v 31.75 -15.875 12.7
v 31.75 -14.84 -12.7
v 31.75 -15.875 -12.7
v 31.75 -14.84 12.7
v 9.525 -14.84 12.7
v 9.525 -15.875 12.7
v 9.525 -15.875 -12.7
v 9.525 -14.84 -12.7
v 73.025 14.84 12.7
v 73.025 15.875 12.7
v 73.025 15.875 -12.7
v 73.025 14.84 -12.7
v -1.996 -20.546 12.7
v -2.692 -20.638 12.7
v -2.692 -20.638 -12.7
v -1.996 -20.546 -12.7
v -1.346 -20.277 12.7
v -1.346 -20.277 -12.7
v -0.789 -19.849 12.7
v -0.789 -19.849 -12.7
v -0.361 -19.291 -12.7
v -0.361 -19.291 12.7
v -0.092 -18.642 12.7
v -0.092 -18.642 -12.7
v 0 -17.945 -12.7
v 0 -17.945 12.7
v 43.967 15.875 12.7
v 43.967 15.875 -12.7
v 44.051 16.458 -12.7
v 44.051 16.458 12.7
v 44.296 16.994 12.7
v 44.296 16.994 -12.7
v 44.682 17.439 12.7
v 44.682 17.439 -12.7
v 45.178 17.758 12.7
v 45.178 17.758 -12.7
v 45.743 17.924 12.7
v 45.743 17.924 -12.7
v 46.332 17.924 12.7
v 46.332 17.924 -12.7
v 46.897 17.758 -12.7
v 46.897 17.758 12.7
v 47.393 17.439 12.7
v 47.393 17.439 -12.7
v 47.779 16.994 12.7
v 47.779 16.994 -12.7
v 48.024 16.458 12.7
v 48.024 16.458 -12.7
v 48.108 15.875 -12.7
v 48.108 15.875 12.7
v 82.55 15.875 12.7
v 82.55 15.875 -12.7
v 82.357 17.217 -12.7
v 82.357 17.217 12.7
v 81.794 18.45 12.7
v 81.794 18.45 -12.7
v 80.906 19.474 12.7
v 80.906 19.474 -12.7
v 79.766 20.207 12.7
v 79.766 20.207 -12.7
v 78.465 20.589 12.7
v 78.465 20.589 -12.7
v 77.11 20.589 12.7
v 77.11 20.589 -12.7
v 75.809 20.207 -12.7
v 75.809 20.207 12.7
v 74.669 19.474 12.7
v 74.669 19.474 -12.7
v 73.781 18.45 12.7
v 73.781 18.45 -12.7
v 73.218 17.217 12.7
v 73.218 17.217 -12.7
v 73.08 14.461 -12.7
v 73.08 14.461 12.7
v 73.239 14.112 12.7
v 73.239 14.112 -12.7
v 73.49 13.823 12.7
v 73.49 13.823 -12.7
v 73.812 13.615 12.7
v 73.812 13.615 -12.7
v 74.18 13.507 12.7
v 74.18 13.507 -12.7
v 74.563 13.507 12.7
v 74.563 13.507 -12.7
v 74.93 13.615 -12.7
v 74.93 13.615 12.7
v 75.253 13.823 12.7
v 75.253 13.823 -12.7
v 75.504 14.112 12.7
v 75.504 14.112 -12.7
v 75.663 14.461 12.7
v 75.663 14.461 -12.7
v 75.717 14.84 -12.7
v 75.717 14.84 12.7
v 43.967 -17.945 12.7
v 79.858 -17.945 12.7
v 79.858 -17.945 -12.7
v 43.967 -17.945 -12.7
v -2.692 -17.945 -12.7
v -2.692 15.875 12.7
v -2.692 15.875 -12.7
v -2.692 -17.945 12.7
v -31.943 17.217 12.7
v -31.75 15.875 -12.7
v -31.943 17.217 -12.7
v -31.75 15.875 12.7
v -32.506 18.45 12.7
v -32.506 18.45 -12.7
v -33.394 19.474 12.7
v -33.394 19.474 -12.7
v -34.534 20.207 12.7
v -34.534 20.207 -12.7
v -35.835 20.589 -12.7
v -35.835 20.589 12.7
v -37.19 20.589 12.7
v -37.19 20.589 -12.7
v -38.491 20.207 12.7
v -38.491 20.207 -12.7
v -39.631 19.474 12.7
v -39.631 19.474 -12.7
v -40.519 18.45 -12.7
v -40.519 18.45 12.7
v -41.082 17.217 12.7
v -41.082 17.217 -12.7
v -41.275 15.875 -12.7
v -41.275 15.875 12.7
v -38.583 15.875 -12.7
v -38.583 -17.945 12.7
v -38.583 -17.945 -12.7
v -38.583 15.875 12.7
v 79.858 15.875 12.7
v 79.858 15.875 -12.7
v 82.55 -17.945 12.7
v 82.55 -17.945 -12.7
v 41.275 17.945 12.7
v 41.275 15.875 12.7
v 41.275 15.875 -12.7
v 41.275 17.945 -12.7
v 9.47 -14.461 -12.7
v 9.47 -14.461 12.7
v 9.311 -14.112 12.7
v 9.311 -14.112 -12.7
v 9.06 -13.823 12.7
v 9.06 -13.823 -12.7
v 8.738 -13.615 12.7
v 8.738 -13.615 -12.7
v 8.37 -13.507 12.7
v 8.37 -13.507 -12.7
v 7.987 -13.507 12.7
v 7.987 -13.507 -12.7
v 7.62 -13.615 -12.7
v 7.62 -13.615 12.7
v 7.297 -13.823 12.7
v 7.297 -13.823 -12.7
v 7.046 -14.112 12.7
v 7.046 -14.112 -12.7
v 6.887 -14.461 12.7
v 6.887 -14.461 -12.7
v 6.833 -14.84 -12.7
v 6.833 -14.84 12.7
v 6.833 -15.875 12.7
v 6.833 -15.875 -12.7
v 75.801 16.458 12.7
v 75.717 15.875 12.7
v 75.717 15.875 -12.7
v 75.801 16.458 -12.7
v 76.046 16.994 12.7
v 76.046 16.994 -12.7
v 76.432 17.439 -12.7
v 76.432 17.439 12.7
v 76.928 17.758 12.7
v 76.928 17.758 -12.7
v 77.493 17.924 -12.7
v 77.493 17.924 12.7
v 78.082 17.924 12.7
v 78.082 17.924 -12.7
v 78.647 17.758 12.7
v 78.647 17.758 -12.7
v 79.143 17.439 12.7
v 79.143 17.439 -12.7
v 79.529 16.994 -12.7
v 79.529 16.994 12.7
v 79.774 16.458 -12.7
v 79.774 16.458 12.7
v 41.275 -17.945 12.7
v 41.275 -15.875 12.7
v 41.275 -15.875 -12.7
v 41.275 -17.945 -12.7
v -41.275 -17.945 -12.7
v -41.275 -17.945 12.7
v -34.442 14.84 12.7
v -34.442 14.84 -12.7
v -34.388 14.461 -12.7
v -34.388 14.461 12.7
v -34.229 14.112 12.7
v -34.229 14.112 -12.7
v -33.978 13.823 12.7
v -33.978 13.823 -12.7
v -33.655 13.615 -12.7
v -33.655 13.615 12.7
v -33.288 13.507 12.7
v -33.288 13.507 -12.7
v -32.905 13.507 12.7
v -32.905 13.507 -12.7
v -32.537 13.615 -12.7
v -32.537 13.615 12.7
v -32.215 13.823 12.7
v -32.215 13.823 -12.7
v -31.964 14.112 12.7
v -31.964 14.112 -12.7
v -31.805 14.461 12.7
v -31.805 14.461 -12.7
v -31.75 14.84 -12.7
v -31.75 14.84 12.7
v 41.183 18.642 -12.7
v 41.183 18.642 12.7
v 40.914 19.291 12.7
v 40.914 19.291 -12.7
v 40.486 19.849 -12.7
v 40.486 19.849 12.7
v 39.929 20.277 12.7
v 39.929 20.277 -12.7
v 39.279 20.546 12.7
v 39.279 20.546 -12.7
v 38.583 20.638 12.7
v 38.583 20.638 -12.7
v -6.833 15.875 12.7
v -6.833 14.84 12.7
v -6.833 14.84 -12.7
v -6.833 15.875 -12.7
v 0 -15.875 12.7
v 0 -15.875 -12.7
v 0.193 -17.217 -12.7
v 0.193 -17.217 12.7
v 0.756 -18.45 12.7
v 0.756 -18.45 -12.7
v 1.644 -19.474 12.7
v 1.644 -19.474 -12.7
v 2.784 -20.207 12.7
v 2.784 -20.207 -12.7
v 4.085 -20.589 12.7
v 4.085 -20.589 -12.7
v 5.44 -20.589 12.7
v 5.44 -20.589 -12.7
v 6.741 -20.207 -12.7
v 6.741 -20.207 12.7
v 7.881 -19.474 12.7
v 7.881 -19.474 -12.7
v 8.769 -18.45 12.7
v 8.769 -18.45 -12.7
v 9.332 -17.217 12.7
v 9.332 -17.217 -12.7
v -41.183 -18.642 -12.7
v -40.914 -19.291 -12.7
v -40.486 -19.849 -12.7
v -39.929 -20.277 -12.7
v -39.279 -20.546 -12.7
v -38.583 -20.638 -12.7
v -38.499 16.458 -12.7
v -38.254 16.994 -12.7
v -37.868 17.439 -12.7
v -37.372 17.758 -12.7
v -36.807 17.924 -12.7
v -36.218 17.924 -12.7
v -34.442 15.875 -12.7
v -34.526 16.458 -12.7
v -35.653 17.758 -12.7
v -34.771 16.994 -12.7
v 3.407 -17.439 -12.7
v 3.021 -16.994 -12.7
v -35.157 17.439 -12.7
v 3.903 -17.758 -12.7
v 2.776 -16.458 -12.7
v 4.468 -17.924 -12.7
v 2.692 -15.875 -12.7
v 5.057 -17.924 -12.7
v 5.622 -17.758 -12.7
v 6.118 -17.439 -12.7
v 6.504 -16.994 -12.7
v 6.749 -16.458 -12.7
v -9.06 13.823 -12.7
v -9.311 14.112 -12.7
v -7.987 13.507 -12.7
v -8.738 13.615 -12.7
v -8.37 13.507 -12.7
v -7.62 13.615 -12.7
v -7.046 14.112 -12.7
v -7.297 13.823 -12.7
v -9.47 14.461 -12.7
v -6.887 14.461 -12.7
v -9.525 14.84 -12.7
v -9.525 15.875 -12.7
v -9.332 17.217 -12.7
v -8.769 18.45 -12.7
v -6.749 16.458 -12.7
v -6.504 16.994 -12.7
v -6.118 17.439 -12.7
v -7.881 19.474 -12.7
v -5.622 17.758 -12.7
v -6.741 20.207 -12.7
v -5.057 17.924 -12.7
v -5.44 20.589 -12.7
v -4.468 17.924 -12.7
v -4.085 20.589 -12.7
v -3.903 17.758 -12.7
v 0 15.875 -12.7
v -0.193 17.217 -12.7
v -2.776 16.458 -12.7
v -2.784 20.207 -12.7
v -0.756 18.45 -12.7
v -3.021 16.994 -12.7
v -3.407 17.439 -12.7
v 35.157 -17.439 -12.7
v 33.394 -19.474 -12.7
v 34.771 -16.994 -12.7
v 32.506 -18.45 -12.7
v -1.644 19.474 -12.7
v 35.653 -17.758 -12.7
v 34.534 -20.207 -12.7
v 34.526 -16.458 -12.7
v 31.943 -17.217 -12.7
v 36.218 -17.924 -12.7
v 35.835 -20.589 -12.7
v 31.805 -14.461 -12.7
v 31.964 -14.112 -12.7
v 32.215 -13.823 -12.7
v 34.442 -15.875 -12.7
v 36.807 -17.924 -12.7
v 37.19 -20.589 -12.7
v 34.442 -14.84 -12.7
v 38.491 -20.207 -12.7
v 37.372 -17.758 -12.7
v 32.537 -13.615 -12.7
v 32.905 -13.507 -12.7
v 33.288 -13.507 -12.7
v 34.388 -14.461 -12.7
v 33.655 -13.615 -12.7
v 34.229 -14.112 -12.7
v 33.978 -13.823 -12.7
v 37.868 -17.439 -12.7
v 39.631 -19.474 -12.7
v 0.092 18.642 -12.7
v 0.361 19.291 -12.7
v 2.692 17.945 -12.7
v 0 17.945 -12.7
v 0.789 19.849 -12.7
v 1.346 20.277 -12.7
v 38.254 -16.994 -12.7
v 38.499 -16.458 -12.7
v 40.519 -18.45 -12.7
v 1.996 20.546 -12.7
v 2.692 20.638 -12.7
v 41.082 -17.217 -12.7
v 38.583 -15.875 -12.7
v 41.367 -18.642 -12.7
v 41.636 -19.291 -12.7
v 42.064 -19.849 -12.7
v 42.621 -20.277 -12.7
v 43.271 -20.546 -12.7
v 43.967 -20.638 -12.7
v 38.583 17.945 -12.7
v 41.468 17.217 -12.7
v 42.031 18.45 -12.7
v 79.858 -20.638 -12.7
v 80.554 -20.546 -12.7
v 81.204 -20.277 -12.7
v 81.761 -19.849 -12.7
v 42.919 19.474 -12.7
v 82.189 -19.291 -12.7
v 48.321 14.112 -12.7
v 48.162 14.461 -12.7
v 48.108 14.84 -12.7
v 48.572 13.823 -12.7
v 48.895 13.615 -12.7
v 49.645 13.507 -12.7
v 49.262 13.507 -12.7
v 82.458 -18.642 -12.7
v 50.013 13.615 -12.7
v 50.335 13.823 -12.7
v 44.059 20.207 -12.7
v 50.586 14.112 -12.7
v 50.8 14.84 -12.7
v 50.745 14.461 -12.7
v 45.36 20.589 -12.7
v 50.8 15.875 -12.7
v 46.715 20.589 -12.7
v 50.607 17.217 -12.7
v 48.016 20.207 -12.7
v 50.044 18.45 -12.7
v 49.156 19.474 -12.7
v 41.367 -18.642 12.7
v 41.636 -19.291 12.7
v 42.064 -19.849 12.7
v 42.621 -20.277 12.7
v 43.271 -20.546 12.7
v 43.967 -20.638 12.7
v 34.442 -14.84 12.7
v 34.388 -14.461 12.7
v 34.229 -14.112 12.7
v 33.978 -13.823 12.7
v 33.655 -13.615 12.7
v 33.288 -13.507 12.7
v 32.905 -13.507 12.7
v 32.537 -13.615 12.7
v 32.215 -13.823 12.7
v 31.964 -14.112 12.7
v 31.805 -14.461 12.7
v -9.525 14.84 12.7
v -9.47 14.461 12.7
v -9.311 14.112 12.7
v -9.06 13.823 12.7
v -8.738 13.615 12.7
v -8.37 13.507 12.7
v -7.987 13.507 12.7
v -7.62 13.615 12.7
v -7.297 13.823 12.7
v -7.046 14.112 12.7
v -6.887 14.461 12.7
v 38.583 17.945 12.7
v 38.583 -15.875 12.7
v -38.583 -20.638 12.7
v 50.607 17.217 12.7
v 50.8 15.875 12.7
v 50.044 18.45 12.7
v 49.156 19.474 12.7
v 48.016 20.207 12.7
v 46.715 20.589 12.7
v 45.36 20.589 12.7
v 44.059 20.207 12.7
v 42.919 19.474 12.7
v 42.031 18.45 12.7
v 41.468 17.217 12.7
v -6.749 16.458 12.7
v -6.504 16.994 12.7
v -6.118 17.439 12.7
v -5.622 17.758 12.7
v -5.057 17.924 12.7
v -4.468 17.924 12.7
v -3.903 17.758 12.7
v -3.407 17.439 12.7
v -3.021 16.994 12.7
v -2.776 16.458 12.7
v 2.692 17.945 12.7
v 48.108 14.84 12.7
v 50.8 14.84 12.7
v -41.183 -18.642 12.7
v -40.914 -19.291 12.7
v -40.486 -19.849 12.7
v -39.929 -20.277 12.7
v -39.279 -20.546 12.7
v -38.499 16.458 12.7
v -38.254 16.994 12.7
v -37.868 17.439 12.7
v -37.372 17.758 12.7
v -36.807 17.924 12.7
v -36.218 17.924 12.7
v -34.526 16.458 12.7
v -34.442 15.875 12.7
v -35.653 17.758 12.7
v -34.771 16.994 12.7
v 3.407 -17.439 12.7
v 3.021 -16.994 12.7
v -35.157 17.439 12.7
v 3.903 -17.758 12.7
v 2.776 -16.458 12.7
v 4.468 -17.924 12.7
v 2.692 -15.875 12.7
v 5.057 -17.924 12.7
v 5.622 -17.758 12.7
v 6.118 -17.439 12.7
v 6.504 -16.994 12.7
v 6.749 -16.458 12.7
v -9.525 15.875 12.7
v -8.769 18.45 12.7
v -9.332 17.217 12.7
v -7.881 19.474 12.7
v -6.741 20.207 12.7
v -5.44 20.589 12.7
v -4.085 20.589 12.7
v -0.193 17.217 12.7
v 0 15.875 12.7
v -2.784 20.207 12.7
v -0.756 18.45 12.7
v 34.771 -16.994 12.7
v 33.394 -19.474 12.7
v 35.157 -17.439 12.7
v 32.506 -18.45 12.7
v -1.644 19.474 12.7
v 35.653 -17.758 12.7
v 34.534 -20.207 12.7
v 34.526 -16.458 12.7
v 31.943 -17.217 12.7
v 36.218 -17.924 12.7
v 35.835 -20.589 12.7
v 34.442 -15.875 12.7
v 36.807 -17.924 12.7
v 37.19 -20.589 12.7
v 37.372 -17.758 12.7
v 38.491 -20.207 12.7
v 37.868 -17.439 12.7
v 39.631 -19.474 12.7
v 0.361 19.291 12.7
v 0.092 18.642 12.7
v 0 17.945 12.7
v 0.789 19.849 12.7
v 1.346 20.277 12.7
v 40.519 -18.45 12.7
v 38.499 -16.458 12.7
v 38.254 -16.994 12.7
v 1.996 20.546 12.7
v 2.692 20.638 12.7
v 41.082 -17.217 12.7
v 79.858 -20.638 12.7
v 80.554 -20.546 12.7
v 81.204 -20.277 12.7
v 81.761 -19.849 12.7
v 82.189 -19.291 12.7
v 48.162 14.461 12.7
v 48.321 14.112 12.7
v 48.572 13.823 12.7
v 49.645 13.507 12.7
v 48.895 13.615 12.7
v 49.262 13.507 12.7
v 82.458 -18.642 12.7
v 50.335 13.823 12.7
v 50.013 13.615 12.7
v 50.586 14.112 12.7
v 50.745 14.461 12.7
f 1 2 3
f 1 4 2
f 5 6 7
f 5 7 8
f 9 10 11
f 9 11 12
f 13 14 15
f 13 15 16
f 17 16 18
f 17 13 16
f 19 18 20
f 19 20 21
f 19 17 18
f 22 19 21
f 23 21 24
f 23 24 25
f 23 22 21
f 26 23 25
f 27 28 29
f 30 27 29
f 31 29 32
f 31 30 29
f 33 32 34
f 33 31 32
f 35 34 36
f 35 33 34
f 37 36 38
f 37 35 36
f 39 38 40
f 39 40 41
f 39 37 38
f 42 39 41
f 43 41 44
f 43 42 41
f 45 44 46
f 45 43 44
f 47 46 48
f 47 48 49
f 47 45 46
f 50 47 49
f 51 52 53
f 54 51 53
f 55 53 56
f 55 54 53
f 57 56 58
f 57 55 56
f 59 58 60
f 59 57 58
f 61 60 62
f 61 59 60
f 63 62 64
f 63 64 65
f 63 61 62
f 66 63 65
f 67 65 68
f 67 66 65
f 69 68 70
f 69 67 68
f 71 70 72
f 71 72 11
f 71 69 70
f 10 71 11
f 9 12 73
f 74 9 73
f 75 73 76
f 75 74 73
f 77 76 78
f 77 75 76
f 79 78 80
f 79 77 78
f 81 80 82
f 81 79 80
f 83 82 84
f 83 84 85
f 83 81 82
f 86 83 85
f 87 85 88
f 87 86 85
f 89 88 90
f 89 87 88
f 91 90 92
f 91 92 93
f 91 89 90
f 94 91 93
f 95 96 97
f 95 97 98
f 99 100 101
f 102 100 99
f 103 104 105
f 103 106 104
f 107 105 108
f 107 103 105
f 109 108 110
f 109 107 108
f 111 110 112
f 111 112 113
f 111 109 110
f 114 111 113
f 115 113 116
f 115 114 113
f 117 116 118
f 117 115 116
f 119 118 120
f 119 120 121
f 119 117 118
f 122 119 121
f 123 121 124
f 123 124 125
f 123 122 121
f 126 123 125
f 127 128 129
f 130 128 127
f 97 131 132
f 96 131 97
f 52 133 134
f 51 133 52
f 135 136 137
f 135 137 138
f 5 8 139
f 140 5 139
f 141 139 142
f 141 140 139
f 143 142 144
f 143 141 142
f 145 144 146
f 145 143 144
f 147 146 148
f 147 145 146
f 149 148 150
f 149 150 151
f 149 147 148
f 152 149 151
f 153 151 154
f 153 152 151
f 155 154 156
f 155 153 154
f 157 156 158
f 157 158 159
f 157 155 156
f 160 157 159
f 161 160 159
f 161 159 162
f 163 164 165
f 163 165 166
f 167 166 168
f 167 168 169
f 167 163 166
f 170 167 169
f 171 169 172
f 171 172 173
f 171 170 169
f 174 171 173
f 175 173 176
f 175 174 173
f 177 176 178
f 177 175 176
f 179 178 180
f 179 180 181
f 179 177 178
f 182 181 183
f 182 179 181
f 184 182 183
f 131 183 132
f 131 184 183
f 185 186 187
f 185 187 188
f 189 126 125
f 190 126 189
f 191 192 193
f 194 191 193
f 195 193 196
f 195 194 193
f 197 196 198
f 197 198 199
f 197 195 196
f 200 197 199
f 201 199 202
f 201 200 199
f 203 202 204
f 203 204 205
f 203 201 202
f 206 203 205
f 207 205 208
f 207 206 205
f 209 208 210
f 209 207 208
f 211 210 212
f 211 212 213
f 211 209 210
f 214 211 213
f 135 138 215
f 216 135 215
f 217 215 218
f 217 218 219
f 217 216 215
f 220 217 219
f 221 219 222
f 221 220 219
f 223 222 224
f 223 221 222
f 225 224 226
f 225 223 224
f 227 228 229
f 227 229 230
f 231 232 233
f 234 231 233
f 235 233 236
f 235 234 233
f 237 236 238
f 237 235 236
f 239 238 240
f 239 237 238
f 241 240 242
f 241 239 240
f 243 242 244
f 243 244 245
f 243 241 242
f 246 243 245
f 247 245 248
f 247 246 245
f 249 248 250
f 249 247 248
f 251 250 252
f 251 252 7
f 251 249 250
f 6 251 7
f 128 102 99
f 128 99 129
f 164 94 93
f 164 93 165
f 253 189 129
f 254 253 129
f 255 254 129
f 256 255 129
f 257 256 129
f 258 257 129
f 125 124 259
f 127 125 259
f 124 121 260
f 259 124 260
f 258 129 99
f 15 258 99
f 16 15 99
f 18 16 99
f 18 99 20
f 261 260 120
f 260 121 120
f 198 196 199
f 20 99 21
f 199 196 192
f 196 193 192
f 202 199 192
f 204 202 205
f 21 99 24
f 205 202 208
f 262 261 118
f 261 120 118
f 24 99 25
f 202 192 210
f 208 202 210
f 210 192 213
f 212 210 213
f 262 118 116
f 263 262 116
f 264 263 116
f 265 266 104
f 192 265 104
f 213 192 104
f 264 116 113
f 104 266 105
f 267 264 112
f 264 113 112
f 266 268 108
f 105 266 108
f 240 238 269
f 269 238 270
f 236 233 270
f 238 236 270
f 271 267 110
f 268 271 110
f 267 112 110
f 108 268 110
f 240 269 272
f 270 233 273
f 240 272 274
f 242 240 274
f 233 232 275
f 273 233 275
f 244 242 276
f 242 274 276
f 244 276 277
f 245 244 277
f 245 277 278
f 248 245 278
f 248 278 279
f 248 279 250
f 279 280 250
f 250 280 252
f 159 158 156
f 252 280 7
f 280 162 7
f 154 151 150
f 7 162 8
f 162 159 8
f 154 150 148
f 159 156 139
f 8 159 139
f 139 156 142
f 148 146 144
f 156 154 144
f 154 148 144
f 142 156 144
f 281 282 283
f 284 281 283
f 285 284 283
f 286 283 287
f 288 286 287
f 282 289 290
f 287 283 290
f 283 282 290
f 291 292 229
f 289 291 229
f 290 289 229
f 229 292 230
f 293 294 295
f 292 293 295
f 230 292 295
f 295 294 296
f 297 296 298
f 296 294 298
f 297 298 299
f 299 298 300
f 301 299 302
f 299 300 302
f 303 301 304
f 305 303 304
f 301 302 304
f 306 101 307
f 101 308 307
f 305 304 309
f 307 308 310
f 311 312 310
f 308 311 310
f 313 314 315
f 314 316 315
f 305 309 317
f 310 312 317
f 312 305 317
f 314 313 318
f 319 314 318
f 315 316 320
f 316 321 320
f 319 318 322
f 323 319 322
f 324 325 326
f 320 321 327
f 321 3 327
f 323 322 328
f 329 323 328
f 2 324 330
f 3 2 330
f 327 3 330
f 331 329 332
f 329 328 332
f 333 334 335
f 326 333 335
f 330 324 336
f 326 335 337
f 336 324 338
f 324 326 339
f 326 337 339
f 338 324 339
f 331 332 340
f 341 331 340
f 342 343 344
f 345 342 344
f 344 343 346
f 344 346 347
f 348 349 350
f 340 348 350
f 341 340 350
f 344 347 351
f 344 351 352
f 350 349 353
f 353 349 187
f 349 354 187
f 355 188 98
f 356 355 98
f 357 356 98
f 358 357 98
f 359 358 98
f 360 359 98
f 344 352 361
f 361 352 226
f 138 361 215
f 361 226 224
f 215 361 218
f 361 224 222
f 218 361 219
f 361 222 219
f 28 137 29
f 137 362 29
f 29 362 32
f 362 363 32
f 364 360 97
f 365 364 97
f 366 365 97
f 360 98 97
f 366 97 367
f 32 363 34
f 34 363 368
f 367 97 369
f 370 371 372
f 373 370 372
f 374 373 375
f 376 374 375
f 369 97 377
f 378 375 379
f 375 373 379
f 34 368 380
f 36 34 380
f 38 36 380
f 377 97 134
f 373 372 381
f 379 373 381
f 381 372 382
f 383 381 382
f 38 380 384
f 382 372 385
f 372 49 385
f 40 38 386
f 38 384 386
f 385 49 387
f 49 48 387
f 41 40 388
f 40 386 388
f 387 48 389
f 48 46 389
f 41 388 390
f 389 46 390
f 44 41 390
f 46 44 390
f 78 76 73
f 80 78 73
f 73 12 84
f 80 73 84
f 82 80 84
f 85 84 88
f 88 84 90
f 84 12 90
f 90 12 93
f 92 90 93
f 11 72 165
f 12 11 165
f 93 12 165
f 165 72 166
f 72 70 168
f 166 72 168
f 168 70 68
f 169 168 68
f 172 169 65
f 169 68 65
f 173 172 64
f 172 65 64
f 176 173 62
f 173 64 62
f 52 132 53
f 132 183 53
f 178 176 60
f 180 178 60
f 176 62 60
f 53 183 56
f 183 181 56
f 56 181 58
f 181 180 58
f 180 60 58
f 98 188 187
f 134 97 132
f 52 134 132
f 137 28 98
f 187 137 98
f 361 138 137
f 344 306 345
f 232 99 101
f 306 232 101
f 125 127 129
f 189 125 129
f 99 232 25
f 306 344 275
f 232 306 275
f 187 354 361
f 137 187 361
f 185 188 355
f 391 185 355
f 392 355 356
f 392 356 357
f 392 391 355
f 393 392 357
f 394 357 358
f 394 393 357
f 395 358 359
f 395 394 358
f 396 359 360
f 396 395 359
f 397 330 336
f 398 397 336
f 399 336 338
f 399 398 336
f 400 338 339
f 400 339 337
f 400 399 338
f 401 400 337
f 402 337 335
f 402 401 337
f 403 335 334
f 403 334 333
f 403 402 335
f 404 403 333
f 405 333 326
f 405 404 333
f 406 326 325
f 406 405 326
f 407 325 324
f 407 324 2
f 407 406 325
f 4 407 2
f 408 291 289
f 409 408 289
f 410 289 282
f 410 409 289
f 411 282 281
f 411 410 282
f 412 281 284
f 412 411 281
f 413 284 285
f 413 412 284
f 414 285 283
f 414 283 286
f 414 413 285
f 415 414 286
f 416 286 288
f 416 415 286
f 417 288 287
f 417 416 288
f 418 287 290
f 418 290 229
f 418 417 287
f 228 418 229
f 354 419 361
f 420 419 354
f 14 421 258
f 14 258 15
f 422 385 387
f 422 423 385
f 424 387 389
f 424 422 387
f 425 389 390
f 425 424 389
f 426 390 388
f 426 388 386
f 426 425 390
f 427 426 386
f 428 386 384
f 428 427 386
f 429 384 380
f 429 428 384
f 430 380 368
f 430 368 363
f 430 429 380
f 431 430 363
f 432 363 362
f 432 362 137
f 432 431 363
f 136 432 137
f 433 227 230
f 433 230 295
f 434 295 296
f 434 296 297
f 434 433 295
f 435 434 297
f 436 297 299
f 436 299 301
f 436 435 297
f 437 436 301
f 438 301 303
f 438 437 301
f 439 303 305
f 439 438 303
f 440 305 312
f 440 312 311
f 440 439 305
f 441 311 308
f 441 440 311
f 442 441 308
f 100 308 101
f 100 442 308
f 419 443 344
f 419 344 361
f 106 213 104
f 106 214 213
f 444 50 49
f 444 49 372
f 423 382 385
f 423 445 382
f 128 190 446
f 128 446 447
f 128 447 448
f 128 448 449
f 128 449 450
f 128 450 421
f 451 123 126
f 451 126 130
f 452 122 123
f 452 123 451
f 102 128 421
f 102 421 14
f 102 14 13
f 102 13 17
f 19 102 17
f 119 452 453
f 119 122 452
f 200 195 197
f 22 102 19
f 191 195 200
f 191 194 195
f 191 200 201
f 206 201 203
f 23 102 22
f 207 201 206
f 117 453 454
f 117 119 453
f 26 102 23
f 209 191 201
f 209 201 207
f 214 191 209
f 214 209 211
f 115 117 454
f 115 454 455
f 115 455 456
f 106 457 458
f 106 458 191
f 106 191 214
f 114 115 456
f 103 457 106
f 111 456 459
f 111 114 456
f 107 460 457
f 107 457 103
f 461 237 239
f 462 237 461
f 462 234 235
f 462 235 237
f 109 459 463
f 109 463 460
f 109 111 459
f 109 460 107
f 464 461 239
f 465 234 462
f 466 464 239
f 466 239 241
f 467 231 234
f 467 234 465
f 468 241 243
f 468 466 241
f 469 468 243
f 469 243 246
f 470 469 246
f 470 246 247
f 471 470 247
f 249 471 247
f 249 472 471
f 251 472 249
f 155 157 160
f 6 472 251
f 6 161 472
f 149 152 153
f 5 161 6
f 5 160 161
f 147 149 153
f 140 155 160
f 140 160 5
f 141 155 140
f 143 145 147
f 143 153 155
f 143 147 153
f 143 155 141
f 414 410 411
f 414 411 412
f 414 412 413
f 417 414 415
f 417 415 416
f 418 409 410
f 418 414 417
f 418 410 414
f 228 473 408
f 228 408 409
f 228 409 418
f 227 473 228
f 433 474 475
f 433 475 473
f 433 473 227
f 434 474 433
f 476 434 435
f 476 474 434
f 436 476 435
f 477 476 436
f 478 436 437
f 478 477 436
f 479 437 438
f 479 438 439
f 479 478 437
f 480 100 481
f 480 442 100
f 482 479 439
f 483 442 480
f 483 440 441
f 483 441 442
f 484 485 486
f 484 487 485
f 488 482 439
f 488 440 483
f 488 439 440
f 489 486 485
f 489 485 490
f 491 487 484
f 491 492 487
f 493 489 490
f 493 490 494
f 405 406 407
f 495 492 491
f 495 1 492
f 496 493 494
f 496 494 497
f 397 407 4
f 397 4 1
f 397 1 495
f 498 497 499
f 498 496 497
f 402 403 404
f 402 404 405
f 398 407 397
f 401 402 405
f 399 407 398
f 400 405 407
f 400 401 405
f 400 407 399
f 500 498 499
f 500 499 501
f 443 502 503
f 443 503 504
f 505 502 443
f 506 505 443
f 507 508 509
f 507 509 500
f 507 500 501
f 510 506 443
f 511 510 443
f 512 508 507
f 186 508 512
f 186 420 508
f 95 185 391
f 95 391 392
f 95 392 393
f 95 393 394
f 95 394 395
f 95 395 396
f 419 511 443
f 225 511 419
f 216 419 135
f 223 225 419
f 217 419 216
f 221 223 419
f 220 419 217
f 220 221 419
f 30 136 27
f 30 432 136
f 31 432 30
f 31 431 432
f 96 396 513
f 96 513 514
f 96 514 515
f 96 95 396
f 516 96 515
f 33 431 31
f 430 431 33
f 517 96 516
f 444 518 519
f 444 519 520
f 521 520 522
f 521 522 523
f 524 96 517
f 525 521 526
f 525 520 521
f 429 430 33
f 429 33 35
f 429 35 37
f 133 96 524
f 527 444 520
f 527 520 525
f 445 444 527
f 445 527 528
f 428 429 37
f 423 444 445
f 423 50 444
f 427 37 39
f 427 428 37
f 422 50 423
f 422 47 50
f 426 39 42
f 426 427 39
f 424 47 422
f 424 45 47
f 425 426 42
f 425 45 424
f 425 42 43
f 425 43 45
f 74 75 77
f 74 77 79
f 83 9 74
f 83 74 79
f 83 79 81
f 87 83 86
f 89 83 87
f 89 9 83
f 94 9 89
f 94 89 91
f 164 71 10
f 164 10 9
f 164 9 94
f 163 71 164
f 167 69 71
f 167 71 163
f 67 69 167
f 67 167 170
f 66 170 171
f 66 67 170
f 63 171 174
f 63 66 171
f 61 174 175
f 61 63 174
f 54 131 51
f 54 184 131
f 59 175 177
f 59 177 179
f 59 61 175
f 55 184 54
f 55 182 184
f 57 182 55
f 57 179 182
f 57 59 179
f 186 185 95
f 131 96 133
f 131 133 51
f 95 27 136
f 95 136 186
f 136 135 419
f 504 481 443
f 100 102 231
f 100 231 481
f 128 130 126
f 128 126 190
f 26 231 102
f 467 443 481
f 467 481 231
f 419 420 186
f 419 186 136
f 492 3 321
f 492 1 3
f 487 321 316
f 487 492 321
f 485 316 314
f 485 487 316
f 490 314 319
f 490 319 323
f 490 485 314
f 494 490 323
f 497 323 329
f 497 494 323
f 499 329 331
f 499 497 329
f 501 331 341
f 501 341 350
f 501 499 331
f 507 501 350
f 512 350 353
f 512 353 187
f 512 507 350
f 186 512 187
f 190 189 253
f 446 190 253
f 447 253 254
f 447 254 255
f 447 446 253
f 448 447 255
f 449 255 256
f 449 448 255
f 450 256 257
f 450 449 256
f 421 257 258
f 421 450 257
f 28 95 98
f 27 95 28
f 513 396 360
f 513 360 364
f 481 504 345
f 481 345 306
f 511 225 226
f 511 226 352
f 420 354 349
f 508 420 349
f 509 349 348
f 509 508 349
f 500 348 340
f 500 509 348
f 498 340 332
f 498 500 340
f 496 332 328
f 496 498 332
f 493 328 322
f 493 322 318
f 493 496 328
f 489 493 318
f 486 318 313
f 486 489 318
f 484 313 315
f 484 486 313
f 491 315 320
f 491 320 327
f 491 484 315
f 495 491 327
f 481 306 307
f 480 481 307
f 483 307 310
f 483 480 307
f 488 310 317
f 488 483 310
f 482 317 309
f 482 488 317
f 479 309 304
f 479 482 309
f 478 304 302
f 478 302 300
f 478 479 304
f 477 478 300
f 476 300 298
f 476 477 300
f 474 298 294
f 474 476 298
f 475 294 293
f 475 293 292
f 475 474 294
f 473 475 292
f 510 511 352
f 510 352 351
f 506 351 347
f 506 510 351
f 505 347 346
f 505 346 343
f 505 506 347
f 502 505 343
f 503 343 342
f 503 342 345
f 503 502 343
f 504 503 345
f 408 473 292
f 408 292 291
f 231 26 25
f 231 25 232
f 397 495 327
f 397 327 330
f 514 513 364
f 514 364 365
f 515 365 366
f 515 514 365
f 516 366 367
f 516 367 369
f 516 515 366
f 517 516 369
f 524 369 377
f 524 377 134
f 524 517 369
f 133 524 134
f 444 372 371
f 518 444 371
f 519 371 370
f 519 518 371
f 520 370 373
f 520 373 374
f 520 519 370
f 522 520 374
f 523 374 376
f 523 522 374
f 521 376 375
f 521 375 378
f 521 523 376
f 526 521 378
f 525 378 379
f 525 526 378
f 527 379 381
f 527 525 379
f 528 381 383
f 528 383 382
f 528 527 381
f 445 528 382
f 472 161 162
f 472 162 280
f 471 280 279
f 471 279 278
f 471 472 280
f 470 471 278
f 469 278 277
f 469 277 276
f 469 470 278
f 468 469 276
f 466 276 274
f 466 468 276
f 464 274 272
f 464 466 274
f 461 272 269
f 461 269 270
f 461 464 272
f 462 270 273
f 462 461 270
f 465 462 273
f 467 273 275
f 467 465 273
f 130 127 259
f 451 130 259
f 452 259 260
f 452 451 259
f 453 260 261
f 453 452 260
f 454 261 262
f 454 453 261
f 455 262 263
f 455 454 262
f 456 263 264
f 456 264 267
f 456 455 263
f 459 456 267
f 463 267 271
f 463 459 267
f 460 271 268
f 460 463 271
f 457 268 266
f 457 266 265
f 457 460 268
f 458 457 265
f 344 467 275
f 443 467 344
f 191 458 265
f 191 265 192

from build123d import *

# Parameters (mm, degrees)
BASE_EXTRUDE_DEPTH = 12.7
CIRPATTERN1_COUNT  = 2
LPATTERN1_COUNT    = 2
LPATTERN1_PITCH    = 82.55


with BuildPart() as part:
    # Sketch1 → Base-Extrude (new, symmetric)
    with BuildSketch(Plane.XY):
        with BuildLine():
            Line((-41.275, 15.875), (-41.275, -17.9451))
            ThreePointArc((-41.275, -17.9451), (-40.486414298, -19.848914298), (-38.5826, -20.6375))
            Line((-38.5826, -20.6375), (-2.6924, -20.6375))
            ThreePointArc((-2.6924, -20.6375), (-0.788585702, -19.848914298), (0, -17.9451))
            Line((0, -17.9451), (0, 15.875))
            ThreePointArc((0, 15.875), (-4.7625, 20.6375), (-9.525, 15.875))
            Line((-9.525, 15.875), (-9.525, 14.83995))
            ThreePointArc((-9.525, 14.83995), (-8.1788, 13.49375), (-6.8326, 14.83995))
            Line((-6.8326, 14.83995), (-6.8326, 15.875))
            ThreePointArc((-6.8326, 15.875), (-4.7625, 17.9451), (-2.6924, 15.875))
            Line((-2.6924, 15.875), (-2.6924, -17.9451))
            Line((-2.6924, -17.9451), (-38.5826, -17.9451))
            Line((-38.5826, -17.9451), (-38.5826, 15.875))
            ThreePointArc((-38.5826, 15.875), (-36.5125, 17.9451), (-34.4424, 15.875))
            Line((-34.4424, 15.875), (-34.4424, 14.83995))
            ThreePointArc((-34.4424, 14.83995), (-33.0962, 13.49375), (-31.75, 14.83995))
            Line((-31.75, 14.83995), (-31.75, 15.875))
            ThreePointArc((-31.75, 15.875), (-36.5125, 20.6375), (-41.275, 15.875))
        make_face()
    base_extrude = extrude(amount=BASE_EXTRUDE_DEPTH, both=True)

    # CirPattern1: Base-Extrude ×2 about axis
    cirpattern1_axis = Axis((0, 0, 0), (0, 0, 1))
    for i in range(1, CIRPATTERN1_COUNT):
        add(base_extrude.rotate(cirpattern1_axis, i * 360 / CIRPATTERN1_COUNT))

    # LPattern1: Base-Extrude ×2
    with Locations(*[(i * LPATTERN1_PITCH, 0, 0) for i in range(1, LPATTERN1_COUNT)]):
        add(base_extrude)


solid = part.part
